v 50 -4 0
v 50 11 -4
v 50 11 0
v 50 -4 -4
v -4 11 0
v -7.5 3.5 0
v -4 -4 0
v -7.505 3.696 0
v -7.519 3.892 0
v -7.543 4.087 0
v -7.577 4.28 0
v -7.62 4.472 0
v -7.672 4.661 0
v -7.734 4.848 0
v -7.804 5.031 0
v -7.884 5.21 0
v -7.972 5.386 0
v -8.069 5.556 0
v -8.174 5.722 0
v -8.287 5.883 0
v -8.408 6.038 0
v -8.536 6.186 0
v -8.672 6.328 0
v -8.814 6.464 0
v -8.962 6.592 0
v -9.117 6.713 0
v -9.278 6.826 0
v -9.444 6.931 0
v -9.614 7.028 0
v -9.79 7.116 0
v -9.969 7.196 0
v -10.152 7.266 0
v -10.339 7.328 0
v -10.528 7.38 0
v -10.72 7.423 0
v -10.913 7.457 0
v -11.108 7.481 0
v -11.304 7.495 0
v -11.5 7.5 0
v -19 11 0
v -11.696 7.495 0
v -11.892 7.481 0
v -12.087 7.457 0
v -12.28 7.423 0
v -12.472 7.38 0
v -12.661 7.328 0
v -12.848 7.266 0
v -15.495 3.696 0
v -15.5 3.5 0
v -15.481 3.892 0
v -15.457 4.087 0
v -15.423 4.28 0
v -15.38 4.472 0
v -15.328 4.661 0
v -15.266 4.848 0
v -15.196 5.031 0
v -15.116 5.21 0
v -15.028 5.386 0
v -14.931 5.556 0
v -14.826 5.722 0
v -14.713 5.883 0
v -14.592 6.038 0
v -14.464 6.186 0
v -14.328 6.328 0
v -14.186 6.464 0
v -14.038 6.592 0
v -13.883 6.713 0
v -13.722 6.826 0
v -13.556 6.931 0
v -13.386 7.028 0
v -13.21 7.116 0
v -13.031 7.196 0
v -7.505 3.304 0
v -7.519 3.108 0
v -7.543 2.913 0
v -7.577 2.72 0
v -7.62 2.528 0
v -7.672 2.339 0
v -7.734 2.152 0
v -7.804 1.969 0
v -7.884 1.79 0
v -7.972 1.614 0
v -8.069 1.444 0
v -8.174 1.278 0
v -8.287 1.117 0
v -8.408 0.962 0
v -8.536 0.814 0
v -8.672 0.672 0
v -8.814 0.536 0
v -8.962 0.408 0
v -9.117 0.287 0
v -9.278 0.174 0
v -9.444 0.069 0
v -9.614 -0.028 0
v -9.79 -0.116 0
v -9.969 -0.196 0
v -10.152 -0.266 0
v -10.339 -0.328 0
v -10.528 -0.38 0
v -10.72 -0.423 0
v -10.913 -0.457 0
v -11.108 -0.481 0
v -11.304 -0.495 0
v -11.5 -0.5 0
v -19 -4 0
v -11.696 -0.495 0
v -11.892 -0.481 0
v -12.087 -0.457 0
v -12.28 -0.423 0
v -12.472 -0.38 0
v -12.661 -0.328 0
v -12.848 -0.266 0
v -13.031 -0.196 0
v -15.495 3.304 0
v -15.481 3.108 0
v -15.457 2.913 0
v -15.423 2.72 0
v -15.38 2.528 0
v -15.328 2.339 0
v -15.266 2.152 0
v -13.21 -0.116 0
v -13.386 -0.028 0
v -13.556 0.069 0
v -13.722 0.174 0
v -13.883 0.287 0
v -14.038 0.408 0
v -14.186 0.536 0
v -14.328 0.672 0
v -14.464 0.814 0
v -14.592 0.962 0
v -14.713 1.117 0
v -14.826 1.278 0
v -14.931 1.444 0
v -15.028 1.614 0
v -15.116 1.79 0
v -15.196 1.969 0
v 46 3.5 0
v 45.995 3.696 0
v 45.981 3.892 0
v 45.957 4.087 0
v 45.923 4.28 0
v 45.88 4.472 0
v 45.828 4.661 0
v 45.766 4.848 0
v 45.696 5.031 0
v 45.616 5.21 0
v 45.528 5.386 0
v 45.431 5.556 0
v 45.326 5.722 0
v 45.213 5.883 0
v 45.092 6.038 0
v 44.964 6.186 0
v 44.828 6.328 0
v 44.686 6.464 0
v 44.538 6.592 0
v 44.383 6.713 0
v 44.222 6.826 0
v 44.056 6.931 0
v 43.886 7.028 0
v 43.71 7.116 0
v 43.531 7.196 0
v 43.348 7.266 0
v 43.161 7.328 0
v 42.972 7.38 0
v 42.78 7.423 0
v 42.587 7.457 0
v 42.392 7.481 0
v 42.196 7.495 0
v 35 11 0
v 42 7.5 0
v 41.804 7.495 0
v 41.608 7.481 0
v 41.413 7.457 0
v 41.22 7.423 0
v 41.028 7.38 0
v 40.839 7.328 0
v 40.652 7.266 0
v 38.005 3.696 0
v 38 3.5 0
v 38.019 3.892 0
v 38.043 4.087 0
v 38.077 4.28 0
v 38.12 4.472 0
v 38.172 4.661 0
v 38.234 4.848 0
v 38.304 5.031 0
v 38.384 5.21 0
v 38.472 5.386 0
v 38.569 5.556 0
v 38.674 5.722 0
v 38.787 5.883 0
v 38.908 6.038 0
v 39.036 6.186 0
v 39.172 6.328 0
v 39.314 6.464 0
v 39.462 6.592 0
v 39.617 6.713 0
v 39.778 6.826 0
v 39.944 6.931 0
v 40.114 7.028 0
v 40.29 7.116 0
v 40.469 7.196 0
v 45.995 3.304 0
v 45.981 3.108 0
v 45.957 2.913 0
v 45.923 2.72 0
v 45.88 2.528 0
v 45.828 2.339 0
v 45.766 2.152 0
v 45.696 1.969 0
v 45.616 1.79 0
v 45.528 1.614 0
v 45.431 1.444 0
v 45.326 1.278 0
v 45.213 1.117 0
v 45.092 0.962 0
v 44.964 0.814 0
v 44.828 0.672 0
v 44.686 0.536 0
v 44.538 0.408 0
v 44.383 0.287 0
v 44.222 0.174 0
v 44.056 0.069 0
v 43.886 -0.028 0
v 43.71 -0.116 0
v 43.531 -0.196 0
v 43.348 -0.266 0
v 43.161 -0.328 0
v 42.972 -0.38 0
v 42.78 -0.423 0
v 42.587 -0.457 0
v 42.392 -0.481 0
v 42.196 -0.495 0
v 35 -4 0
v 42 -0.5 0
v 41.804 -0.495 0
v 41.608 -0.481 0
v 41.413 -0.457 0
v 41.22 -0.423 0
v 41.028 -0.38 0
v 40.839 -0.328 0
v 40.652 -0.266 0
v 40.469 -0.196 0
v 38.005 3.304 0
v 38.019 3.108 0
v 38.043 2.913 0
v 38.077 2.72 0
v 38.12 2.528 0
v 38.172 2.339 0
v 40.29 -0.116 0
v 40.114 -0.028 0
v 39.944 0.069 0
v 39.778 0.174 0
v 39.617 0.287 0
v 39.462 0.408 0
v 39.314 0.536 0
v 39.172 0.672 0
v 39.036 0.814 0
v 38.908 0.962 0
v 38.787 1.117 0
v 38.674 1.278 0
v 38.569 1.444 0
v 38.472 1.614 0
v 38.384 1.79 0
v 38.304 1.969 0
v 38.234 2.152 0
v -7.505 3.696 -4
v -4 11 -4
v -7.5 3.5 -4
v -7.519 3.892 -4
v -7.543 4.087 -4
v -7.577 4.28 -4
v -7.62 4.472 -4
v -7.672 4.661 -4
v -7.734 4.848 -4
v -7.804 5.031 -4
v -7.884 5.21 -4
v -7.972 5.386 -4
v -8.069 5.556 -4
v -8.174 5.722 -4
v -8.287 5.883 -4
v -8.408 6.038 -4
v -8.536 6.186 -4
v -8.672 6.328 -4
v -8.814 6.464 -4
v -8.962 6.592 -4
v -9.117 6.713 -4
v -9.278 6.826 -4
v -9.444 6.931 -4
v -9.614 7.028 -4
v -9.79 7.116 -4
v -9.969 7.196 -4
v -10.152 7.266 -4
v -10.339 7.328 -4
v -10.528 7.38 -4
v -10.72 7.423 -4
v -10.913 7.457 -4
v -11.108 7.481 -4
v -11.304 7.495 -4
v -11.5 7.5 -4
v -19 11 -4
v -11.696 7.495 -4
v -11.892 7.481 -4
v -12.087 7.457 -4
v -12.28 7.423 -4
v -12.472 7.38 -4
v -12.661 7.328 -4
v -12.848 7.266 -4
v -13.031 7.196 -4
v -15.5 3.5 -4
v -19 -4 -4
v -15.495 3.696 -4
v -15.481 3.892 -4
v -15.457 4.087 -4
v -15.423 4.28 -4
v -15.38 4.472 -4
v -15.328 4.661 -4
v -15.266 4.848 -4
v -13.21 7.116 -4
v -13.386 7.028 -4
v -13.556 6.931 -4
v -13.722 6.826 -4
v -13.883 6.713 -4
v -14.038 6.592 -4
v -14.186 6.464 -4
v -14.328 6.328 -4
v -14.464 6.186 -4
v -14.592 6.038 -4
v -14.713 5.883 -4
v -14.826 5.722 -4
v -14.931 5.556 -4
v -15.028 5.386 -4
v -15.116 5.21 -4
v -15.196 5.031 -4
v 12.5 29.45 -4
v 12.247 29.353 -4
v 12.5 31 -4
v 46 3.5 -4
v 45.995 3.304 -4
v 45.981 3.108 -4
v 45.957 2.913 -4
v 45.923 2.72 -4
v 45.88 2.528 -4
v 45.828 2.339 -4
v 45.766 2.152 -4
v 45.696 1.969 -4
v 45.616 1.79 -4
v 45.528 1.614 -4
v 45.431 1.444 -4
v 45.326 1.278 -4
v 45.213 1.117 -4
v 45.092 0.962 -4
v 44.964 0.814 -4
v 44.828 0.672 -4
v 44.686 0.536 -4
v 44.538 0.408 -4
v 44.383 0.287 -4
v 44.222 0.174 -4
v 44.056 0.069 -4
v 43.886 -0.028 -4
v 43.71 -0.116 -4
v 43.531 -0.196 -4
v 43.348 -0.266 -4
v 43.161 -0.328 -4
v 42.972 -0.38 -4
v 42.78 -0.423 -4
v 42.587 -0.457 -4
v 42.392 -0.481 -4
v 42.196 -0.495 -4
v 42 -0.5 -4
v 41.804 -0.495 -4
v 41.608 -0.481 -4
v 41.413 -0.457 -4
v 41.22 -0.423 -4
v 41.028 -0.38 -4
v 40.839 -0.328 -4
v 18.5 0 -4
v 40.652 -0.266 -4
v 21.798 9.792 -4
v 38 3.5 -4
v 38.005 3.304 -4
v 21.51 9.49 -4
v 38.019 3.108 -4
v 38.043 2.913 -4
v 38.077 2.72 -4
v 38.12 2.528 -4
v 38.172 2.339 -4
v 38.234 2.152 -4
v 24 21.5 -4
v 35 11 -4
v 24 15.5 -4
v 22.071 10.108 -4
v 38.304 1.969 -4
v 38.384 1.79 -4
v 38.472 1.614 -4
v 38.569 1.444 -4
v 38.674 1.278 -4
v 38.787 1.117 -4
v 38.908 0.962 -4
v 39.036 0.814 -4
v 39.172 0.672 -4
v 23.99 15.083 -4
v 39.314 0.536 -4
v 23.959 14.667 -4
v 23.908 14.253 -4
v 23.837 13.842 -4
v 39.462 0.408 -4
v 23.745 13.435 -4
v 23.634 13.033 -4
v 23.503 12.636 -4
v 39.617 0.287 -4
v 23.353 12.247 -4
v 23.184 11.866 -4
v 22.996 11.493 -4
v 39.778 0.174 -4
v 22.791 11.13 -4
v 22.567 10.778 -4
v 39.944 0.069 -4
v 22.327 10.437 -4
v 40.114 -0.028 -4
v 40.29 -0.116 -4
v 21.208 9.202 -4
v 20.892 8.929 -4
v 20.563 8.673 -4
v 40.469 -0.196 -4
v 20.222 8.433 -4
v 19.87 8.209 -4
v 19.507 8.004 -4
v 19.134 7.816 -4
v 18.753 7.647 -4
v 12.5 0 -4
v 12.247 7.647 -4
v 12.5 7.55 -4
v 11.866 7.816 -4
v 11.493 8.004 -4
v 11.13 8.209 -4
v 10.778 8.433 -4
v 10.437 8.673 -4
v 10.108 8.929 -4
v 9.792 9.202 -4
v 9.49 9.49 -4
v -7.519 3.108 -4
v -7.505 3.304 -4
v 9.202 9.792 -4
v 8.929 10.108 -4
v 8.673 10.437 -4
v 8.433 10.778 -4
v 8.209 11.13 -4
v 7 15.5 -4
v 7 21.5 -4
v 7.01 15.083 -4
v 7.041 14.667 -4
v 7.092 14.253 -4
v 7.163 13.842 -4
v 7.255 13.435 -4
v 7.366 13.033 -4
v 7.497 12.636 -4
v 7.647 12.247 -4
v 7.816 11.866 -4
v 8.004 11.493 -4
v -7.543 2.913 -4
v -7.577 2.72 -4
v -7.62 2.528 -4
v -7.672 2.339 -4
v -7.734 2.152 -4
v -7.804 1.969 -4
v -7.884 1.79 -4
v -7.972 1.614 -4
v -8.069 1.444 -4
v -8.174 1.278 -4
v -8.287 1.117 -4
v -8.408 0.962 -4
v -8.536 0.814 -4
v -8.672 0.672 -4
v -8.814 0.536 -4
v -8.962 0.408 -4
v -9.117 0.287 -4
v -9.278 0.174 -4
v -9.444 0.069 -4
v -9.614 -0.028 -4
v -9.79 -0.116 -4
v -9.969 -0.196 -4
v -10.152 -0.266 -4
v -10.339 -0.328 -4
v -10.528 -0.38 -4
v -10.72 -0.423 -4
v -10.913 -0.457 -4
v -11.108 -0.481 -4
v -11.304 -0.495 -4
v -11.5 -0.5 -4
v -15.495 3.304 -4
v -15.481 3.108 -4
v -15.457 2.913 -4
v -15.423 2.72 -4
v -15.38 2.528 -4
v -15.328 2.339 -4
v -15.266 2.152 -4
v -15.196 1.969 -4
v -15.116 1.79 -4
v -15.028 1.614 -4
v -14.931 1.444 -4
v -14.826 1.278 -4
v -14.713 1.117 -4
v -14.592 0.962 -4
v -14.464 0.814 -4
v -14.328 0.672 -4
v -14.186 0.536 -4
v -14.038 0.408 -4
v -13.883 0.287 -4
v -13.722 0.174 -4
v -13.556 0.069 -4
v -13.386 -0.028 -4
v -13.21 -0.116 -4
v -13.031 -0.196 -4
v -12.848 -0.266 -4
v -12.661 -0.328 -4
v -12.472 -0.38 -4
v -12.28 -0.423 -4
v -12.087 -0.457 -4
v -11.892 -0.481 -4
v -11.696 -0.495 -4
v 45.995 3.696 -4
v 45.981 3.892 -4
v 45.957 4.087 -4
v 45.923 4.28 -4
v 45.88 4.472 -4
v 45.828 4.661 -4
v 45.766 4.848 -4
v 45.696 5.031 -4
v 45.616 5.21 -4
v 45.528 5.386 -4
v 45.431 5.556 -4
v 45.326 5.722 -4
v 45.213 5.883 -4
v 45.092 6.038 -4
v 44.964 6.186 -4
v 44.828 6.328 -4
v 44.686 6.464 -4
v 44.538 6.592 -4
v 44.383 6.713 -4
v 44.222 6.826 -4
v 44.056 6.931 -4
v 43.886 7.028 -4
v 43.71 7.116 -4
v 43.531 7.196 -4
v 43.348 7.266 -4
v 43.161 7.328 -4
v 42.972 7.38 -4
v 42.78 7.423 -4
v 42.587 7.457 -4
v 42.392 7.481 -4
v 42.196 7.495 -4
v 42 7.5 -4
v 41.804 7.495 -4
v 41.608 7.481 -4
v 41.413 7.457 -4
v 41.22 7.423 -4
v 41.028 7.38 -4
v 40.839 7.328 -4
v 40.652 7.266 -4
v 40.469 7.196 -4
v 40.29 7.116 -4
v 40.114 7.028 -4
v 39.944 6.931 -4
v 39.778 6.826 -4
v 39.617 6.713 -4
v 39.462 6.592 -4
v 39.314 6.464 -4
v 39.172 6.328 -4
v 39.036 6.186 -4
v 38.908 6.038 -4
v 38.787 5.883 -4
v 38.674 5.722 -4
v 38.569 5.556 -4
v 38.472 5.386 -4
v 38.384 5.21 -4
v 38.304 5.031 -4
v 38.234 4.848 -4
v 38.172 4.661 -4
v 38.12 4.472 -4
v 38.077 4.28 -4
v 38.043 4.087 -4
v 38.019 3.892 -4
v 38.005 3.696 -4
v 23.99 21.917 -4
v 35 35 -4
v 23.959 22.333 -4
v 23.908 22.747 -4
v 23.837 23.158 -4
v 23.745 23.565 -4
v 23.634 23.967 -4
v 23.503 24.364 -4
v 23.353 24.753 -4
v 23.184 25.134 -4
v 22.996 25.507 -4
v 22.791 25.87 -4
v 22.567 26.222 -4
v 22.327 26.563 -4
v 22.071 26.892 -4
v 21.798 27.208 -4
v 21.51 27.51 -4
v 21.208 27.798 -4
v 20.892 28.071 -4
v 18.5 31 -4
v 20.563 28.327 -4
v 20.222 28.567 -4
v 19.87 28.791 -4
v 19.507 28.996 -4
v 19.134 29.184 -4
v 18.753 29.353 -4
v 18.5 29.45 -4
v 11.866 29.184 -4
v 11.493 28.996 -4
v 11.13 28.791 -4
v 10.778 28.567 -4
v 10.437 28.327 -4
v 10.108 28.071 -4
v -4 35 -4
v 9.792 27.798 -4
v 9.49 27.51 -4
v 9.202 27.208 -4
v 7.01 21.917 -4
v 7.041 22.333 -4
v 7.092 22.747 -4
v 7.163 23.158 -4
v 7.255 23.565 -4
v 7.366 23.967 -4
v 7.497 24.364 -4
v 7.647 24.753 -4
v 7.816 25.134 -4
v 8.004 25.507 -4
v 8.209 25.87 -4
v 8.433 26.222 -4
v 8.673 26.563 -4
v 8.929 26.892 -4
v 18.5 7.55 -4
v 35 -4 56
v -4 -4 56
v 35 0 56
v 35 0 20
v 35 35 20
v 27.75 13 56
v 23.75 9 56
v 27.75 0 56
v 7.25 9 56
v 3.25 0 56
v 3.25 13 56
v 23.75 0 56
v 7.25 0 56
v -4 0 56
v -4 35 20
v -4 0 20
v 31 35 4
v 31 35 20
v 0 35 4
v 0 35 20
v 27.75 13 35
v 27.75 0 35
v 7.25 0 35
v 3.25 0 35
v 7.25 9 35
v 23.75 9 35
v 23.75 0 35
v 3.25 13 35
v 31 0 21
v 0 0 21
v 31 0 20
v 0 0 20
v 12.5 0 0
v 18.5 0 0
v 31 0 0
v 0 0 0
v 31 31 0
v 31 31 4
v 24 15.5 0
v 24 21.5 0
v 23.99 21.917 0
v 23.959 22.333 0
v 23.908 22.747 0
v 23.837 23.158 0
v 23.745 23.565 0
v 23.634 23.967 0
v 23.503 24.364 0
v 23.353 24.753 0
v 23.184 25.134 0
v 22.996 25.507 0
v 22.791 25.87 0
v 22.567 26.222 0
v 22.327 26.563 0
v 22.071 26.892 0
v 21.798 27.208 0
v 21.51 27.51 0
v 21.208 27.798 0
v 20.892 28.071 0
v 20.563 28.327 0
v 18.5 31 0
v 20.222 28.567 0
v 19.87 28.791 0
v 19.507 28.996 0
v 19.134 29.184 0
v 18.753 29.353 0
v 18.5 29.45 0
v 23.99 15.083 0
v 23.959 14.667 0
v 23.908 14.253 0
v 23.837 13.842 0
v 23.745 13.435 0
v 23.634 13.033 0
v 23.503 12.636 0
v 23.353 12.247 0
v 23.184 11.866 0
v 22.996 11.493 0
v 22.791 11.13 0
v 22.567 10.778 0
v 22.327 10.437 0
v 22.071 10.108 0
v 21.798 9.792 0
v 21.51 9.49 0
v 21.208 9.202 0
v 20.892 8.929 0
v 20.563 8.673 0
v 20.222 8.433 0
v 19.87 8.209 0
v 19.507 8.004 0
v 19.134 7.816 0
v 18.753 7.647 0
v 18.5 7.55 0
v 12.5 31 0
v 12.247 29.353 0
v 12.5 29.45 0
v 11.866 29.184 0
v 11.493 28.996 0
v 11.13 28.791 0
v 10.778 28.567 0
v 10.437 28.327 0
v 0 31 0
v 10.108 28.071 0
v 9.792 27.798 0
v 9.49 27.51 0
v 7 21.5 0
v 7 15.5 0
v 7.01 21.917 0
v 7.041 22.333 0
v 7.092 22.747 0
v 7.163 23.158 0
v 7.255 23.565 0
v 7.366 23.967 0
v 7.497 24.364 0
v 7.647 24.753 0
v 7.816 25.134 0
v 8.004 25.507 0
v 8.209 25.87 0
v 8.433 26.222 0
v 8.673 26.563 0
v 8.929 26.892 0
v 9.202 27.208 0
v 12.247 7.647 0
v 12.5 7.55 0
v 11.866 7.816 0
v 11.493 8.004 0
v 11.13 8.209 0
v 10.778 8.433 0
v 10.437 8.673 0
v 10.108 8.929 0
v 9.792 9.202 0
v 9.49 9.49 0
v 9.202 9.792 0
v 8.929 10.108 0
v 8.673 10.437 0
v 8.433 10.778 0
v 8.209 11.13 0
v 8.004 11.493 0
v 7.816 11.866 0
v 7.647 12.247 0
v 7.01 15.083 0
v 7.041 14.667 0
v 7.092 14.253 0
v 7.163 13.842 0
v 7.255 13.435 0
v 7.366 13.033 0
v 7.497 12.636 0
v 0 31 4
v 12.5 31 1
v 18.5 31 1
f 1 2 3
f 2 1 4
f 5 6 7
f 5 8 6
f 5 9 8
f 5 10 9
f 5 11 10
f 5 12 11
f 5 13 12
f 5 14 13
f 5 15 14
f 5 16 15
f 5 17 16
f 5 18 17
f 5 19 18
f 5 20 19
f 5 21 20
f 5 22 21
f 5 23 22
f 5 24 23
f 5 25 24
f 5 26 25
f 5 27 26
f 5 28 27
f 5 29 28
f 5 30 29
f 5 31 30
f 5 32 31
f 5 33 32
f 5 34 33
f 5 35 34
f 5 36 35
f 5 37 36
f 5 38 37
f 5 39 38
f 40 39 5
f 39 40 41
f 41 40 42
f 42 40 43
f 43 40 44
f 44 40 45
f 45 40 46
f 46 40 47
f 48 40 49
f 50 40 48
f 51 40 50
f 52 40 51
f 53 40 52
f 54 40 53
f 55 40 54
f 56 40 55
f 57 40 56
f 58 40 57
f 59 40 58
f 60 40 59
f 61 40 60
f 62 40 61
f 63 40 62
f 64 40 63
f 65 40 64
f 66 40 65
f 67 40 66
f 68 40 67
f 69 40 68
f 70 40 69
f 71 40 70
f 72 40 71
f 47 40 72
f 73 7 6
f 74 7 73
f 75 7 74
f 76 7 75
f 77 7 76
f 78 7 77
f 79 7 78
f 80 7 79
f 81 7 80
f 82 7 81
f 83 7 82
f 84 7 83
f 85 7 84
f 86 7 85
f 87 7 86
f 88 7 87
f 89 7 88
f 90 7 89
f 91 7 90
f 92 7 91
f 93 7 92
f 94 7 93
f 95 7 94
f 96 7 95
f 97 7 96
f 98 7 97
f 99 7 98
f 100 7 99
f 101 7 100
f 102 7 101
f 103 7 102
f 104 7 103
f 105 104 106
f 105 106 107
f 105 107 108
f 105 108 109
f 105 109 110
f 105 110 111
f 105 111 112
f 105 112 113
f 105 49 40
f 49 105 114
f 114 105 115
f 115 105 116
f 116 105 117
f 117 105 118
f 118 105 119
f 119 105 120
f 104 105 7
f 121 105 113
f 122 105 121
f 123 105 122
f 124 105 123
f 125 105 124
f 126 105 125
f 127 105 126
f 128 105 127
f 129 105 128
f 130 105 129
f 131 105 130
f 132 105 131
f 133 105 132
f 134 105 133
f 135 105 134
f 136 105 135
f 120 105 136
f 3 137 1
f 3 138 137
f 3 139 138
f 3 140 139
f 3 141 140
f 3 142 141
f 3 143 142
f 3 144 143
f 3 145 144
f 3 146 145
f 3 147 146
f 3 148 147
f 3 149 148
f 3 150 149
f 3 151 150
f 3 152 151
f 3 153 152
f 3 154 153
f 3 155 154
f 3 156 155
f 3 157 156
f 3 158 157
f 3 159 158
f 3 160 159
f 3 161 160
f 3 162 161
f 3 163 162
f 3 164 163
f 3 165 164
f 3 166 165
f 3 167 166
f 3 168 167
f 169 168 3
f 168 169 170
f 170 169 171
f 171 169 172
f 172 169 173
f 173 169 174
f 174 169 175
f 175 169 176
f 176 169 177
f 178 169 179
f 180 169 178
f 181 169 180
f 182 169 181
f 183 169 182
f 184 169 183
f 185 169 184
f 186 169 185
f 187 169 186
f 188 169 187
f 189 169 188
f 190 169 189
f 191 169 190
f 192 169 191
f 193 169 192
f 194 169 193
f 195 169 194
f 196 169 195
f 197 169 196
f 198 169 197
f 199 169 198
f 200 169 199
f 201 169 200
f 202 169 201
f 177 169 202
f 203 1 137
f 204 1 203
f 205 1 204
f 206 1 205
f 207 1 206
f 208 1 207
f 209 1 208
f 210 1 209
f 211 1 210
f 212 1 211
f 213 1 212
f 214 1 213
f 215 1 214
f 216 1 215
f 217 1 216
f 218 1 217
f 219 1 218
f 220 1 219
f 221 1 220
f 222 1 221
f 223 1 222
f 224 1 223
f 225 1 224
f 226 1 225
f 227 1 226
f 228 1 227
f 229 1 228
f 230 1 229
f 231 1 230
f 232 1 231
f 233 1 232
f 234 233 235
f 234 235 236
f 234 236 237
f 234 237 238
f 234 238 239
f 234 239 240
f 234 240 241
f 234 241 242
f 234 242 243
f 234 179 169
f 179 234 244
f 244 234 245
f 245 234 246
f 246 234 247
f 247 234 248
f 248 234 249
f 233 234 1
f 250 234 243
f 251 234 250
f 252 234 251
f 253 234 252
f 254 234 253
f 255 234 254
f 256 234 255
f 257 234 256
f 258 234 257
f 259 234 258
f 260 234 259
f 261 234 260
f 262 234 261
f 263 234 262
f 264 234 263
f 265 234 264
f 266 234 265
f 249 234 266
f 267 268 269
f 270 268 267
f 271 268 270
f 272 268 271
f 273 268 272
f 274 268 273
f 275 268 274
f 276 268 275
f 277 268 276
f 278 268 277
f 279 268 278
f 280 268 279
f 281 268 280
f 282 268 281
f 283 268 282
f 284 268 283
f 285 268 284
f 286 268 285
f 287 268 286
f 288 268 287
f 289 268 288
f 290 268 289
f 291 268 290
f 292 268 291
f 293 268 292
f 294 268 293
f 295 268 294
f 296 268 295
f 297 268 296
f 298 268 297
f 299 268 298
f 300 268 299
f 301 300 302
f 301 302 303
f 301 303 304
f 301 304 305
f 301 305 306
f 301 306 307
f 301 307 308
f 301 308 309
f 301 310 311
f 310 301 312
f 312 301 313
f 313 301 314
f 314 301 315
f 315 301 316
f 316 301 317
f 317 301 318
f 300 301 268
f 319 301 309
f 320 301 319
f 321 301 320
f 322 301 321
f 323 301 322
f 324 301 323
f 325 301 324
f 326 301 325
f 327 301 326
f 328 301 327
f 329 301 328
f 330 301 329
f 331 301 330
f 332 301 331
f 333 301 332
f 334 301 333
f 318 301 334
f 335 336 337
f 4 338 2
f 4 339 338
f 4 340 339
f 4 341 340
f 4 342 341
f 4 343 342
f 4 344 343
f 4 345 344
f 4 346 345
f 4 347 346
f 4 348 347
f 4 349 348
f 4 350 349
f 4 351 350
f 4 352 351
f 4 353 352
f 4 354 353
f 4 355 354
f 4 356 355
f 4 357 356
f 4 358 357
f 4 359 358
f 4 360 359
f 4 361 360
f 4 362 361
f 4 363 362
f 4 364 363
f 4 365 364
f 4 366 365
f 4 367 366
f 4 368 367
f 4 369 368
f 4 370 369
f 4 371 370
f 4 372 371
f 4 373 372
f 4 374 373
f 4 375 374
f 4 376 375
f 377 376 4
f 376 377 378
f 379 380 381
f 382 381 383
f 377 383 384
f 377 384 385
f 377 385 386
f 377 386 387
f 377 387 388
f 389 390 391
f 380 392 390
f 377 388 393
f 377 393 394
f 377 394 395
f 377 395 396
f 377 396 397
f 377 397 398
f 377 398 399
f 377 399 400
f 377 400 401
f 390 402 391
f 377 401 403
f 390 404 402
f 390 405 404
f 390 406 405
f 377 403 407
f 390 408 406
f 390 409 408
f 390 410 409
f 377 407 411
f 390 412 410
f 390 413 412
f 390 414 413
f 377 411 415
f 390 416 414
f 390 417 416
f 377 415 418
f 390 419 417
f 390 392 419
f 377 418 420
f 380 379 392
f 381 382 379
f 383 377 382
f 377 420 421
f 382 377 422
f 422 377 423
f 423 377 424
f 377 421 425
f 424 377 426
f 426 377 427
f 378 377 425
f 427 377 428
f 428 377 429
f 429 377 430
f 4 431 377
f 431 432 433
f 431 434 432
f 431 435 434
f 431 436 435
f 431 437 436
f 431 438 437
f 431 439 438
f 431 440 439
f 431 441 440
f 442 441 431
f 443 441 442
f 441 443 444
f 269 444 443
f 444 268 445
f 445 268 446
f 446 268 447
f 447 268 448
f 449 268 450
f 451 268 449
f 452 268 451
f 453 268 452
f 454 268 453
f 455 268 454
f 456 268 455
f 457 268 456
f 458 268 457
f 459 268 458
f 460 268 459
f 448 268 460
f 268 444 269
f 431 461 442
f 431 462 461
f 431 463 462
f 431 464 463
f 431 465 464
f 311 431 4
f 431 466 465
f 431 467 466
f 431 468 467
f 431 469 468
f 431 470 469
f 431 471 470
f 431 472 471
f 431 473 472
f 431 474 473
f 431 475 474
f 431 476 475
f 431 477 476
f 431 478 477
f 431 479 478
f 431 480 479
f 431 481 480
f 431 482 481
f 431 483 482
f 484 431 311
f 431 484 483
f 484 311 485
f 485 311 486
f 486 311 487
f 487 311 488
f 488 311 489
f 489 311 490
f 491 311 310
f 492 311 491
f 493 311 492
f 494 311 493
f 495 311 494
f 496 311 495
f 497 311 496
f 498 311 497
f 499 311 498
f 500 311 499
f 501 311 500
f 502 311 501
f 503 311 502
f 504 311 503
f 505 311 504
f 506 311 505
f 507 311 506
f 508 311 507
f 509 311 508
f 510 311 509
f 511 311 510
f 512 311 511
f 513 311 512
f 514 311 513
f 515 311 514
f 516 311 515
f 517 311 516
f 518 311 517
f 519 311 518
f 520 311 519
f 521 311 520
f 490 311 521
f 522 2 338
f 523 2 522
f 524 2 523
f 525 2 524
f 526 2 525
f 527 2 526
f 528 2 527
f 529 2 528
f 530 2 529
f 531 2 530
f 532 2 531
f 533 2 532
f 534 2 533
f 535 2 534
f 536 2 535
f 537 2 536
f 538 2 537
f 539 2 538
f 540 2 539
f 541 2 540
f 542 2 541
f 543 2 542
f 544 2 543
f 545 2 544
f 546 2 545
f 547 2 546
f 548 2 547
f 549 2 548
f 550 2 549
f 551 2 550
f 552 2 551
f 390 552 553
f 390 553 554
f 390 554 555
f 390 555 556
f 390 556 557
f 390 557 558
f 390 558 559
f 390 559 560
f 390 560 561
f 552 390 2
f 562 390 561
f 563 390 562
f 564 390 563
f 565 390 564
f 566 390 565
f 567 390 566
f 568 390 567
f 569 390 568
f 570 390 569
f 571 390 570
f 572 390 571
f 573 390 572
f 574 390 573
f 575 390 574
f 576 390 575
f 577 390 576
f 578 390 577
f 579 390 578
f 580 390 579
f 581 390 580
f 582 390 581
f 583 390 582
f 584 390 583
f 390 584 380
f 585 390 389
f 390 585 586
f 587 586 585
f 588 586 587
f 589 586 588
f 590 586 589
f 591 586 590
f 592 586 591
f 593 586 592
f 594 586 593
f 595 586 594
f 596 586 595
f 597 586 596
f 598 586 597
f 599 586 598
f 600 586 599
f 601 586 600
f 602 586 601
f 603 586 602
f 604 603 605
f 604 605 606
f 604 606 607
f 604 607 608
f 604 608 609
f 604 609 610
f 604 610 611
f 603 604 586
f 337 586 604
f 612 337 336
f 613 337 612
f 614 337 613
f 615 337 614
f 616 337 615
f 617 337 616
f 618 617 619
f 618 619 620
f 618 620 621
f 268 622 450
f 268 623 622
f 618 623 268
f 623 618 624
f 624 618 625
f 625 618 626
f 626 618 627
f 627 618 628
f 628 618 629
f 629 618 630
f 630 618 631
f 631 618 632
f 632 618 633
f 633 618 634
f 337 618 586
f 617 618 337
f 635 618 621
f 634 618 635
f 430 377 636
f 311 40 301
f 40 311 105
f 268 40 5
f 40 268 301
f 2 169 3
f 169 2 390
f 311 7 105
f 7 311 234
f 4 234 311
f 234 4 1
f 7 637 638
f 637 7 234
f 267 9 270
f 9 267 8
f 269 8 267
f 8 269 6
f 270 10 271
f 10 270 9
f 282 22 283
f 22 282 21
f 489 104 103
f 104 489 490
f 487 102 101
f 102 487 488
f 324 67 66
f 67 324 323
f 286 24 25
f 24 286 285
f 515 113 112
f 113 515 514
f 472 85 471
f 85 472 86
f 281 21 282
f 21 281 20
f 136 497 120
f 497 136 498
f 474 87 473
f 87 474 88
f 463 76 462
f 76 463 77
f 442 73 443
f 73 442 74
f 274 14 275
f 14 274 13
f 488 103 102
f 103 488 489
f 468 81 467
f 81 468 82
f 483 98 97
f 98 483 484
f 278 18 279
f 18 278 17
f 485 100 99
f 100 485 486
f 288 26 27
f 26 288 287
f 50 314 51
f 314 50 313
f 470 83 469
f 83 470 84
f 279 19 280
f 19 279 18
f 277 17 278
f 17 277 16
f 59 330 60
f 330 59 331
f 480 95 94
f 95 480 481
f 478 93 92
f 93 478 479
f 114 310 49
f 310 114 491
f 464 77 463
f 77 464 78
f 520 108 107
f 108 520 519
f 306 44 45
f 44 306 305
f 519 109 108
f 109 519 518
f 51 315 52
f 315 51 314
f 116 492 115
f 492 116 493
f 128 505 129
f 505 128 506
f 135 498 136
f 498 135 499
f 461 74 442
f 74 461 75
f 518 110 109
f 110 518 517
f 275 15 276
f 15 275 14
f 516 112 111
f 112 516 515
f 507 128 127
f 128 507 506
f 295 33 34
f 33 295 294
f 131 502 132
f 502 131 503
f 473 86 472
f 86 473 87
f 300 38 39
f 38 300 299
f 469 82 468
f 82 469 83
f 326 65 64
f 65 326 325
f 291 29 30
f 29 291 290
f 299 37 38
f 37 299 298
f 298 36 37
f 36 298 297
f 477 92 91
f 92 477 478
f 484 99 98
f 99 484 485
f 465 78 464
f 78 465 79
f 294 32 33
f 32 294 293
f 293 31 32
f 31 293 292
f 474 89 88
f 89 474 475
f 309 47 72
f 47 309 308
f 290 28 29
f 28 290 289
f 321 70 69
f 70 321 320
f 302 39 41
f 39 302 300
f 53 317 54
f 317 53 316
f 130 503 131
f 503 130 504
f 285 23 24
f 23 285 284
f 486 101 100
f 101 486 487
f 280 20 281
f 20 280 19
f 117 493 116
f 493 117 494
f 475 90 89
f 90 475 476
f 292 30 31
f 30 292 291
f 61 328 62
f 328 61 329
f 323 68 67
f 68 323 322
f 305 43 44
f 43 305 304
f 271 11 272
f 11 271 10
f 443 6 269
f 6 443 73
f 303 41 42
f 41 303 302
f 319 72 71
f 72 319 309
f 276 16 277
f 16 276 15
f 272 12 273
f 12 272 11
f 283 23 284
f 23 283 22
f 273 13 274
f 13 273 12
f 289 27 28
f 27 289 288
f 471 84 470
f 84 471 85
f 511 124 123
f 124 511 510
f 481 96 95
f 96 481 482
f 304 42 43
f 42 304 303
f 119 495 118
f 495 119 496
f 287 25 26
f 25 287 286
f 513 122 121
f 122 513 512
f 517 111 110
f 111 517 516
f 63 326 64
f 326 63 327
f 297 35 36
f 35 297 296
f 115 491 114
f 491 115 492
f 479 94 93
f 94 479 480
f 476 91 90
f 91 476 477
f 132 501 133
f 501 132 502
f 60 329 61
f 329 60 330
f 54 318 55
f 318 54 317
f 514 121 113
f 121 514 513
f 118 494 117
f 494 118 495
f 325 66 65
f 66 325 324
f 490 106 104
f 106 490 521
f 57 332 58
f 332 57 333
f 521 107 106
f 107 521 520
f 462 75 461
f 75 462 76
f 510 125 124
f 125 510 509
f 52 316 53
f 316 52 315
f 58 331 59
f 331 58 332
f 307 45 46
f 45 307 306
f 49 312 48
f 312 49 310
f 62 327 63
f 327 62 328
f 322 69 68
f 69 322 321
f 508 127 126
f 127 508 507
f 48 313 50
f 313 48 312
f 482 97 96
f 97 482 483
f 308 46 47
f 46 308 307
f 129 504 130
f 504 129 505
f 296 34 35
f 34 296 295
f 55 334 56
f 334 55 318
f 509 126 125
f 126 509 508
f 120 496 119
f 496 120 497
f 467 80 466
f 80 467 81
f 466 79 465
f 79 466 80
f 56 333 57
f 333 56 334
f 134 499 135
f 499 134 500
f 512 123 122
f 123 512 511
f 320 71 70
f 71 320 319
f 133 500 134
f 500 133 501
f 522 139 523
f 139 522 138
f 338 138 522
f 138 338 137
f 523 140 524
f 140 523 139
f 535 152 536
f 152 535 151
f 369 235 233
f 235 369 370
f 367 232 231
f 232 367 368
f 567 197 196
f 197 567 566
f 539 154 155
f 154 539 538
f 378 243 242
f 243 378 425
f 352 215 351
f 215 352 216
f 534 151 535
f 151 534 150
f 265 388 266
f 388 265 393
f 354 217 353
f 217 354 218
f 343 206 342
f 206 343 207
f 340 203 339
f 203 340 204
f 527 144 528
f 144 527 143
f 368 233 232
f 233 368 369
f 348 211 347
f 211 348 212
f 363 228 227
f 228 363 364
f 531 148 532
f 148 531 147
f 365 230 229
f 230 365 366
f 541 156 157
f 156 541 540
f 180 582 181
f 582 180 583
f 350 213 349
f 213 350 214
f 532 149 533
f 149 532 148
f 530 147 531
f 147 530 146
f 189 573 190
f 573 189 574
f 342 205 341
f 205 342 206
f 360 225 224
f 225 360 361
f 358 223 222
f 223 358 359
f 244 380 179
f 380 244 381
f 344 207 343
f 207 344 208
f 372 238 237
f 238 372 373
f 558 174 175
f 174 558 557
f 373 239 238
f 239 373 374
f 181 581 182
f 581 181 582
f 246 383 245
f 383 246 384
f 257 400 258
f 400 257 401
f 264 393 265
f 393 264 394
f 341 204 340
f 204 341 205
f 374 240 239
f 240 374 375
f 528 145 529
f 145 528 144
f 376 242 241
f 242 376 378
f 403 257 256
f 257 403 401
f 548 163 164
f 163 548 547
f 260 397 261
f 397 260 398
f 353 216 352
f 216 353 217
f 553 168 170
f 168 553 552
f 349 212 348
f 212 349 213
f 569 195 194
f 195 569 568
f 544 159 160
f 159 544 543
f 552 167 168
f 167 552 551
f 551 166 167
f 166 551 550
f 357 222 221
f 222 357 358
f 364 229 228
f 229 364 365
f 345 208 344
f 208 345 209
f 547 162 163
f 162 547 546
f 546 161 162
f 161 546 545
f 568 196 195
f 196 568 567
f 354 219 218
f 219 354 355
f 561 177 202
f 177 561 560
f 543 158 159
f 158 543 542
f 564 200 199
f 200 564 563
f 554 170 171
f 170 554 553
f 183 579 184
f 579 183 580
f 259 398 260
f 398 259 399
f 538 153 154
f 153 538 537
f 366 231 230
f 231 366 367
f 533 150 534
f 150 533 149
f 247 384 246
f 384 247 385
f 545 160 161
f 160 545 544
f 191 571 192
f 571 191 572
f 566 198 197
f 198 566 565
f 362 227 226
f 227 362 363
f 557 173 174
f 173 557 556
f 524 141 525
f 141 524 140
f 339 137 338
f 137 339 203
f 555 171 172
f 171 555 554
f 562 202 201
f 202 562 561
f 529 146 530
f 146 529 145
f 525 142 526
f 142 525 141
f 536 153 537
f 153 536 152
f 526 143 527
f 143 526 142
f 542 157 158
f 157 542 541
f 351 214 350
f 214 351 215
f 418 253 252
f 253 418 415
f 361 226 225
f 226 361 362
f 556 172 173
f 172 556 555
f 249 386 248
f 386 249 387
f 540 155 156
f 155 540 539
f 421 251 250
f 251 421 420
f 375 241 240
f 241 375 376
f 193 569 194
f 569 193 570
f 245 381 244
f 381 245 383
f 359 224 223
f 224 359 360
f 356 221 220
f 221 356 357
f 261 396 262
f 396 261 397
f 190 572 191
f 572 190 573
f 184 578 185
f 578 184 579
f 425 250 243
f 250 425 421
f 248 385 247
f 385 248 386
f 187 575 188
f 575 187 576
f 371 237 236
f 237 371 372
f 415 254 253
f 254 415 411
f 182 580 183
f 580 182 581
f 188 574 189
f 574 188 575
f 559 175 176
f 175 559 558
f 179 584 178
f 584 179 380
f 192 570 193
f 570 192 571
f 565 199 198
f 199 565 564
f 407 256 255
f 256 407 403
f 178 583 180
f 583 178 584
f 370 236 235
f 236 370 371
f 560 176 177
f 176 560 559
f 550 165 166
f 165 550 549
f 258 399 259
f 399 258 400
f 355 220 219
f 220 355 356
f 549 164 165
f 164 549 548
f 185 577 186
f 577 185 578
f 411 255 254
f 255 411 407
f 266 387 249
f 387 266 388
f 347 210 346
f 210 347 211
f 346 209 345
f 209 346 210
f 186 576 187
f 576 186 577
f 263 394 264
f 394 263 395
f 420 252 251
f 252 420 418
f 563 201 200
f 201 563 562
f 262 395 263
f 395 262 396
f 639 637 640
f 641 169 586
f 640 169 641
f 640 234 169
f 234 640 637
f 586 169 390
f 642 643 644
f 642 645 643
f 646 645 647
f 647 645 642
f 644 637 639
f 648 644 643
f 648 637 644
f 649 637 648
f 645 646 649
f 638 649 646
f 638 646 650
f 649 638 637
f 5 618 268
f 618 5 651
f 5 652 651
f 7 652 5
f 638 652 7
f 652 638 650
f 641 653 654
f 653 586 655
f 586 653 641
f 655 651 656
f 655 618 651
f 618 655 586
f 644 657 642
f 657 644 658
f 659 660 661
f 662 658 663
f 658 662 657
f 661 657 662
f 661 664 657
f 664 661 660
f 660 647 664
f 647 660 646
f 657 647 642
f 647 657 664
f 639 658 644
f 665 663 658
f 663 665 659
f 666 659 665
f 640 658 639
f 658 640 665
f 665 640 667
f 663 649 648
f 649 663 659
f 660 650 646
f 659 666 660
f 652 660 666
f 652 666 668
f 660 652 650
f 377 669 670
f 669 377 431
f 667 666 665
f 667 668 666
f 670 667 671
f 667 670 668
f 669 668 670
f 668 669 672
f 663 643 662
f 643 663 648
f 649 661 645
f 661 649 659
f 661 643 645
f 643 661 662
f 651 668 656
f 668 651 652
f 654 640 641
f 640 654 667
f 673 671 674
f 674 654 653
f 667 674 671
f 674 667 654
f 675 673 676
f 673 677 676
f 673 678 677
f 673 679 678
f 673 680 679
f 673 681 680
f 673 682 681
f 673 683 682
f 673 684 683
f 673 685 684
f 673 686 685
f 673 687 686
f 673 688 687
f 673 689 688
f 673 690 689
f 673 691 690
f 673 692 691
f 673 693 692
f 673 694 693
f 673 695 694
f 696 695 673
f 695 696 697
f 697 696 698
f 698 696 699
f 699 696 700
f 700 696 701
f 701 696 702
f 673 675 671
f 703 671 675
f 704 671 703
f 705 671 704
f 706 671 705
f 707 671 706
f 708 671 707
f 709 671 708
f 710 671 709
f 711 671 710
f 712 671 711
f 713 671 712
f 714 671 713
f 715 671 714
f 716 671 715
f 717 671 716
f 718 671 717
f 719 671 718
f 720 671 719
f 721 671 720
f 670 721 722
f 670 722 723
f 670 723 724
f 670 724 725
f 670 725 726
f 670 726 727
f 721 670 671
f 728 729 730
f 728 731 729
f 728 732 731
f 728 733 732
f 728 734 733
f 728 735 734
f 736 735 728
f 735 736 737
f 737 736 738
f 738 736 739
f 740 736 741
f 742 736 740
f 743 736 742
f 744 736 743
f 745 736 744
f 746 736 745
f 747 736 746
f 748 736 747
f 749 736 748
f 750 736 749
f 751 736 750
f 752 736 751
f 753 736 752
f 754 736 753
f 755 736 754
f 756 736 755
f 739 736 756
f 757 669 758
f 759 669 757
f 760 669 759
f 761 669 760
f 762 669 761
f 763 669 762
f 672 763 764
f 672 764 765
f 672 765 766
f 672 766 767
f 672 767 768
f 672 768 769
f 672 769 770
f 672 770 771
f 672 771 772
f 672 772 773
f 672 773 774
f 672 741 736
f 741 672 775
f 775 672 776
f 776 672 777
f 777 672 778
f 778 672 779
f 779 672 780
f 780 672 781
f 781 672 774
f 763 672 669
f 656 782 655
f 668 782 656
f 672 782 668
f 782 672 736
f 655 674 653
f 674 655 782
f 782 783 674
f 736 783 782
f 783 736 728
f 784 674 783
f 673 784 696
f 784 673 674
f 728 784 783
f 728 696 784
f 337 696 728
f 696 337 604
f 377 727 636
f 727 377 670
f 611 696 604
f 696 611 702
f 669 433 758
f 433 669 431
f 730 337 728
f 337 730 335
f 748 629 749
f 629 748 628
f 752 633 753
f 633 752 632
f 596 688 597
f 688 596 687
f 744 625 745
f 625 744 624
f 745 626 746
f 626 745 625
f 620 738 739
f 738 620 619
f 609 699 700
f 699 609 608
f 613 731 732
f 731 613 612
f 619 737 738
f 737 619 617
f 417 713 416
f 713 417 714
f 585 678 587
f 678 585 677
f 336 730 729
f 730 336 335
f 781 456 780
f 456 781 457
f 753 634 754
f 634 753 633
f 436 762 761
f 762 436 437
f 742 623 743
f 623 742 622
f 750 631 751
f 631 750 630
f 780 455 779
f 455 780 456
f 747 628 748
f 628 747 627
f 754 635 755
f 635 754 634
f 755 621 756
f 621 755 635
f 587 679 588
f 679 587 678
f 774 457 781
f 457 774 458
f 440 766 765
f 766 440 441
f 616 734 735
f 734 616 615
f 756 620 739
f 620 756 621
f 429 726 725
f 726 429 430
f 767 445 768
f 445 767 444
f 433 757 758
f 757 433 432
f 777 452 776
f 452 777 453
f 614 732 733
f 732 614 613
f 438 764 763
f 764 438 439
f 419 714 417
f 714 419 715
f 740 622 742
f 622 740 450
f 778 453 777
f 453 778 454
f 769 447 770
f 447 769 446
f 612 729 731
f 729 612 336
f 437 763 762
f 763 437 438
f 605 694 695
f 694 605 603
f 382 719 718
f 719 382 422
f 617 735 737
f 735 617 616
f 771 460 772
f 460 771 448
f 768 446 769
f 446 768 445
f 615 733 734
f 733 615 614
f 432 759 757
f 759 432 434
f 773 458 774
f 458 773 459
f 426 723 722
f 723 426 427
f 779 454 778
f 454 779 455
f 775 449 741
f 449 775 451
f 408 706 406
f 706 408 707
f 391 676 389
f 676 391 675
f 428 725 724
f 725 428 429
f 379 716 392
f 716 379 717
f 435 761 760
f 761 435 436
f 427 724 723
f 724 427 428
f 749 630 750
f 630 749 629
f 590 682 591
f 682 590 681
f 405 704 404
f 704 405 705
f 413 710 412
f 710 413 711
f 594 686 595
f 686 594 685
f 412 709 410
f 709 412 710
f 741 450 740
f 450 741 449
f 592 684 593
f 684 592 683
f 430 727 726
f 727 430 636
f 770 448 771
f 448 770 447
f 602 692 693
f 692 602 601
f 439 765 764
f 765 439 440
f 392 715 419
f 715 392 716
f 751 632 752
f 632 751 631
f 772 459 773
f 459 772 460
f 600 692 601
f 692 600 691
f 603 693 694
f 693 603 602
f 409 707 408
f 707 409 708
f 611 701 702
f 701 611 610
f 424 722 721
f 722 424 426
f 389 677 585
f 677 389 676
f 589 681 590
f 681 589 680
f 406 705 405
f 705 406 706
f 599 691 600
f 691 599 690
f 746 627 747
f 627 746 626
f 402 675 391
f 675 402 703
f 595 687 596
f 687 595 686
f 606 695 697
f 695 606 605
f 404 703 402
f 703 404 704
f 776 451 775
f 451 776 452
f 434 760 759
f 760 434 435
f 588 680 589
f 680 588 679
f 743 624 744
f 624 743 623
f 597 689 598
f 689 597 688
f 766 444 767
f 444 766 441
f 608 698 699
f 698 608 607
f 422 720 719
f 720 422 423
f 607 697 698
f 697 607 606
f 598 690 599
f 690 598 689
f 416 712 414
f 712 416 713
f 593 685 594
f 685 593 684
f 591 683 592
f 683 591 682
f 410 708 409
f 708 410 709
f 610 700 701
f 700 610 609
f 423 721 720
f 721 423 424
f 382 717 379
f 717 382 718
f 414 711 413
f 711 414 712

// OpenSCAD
/* Mount / enclosure for an 18MP Raspberry Pi camera
 * 
 * Designed for 3D printing, long term use in growth chambers,
 * and to protect the camera from jostling and cable issues.
 * 
 * Contact:  zac.hatfield.dodds@gmail.com
 */
 
 // Currently maintained by Ming-Dao Chia 
 // (Ming-Dao.Chia@anu.edu.au)

$fn=128; // circles as n-sided shapes

/* Constants for parametric adjustment */
// XY size, z height
camXY = 31;
height = 60;
// height of enclosing walls
wallH = 20;
// width of surfaces (for strength and inset nut compatibility)
width = 4;
// dimensions of USB plug and cable to hold
usbW = 16.5;
usbD = 9;
cablediam = 5;
// width of bottom cutout and diam of lens hole (inc. spacing)
cutout = 6;
lens = 17;


/* The actual design code */
//rotate([90,0,0]) // lay on back to print
difference() {
// Main brick to subtract from
translate([-width,-width,-width]) union(){
	cube([camXY+2*width,camXY+2*width,height]);
	// tabs for bolts
	translate([-15,0,0]) difference(){
		cube([camXY+2*(width+15),15,width]);
		translate([15/2, 15/2, -1]) cylinder(d=8, h=width+2);
		translate([camXY+2*15,15/2,-1]) cylinder(d=8, h=width+2);
		}
	}

//Cut off most of the top, except a post for the cable
difference(){
    // main cutting cube
	translate([-2*width,-2*width,wallH]) cube([camXY*2,camXY*2,height]);
	
    // don't cut off back wall
    translate([-width,-width,0]) cube([camXY*2,width,height]);
    
    // remove usb-holder from the cutaway
	translate([(camXY-usbW)/2-width,0,wallH+15]) difference(){
		cube([usbW+2*width,usbD+width,21]);
		translate([width,-1,-1]) cube([usbW,usbD+1,23]);
		}
	}

// cut out spaces for the silicon, lens, wires, etc
// keeping a lip at the front...
difference(){
    cube([camXY,camXY+width+1,wallH+1]);
    translate([0, camXY, 0]) cube([2*camXY, width+1, width]);
};
translate([(camXY-cutout)/2,0,-1-width]) cube([cutout,camXY,width+2]);

// lens has to go in at an angle
translate([camXY/2,camXY/2,-1-width]) hull(){
    cylinder(d=lens,h=width+2);
    translate([0, 6, 0])cylinder(d=lens,h=width+2);
};

};
